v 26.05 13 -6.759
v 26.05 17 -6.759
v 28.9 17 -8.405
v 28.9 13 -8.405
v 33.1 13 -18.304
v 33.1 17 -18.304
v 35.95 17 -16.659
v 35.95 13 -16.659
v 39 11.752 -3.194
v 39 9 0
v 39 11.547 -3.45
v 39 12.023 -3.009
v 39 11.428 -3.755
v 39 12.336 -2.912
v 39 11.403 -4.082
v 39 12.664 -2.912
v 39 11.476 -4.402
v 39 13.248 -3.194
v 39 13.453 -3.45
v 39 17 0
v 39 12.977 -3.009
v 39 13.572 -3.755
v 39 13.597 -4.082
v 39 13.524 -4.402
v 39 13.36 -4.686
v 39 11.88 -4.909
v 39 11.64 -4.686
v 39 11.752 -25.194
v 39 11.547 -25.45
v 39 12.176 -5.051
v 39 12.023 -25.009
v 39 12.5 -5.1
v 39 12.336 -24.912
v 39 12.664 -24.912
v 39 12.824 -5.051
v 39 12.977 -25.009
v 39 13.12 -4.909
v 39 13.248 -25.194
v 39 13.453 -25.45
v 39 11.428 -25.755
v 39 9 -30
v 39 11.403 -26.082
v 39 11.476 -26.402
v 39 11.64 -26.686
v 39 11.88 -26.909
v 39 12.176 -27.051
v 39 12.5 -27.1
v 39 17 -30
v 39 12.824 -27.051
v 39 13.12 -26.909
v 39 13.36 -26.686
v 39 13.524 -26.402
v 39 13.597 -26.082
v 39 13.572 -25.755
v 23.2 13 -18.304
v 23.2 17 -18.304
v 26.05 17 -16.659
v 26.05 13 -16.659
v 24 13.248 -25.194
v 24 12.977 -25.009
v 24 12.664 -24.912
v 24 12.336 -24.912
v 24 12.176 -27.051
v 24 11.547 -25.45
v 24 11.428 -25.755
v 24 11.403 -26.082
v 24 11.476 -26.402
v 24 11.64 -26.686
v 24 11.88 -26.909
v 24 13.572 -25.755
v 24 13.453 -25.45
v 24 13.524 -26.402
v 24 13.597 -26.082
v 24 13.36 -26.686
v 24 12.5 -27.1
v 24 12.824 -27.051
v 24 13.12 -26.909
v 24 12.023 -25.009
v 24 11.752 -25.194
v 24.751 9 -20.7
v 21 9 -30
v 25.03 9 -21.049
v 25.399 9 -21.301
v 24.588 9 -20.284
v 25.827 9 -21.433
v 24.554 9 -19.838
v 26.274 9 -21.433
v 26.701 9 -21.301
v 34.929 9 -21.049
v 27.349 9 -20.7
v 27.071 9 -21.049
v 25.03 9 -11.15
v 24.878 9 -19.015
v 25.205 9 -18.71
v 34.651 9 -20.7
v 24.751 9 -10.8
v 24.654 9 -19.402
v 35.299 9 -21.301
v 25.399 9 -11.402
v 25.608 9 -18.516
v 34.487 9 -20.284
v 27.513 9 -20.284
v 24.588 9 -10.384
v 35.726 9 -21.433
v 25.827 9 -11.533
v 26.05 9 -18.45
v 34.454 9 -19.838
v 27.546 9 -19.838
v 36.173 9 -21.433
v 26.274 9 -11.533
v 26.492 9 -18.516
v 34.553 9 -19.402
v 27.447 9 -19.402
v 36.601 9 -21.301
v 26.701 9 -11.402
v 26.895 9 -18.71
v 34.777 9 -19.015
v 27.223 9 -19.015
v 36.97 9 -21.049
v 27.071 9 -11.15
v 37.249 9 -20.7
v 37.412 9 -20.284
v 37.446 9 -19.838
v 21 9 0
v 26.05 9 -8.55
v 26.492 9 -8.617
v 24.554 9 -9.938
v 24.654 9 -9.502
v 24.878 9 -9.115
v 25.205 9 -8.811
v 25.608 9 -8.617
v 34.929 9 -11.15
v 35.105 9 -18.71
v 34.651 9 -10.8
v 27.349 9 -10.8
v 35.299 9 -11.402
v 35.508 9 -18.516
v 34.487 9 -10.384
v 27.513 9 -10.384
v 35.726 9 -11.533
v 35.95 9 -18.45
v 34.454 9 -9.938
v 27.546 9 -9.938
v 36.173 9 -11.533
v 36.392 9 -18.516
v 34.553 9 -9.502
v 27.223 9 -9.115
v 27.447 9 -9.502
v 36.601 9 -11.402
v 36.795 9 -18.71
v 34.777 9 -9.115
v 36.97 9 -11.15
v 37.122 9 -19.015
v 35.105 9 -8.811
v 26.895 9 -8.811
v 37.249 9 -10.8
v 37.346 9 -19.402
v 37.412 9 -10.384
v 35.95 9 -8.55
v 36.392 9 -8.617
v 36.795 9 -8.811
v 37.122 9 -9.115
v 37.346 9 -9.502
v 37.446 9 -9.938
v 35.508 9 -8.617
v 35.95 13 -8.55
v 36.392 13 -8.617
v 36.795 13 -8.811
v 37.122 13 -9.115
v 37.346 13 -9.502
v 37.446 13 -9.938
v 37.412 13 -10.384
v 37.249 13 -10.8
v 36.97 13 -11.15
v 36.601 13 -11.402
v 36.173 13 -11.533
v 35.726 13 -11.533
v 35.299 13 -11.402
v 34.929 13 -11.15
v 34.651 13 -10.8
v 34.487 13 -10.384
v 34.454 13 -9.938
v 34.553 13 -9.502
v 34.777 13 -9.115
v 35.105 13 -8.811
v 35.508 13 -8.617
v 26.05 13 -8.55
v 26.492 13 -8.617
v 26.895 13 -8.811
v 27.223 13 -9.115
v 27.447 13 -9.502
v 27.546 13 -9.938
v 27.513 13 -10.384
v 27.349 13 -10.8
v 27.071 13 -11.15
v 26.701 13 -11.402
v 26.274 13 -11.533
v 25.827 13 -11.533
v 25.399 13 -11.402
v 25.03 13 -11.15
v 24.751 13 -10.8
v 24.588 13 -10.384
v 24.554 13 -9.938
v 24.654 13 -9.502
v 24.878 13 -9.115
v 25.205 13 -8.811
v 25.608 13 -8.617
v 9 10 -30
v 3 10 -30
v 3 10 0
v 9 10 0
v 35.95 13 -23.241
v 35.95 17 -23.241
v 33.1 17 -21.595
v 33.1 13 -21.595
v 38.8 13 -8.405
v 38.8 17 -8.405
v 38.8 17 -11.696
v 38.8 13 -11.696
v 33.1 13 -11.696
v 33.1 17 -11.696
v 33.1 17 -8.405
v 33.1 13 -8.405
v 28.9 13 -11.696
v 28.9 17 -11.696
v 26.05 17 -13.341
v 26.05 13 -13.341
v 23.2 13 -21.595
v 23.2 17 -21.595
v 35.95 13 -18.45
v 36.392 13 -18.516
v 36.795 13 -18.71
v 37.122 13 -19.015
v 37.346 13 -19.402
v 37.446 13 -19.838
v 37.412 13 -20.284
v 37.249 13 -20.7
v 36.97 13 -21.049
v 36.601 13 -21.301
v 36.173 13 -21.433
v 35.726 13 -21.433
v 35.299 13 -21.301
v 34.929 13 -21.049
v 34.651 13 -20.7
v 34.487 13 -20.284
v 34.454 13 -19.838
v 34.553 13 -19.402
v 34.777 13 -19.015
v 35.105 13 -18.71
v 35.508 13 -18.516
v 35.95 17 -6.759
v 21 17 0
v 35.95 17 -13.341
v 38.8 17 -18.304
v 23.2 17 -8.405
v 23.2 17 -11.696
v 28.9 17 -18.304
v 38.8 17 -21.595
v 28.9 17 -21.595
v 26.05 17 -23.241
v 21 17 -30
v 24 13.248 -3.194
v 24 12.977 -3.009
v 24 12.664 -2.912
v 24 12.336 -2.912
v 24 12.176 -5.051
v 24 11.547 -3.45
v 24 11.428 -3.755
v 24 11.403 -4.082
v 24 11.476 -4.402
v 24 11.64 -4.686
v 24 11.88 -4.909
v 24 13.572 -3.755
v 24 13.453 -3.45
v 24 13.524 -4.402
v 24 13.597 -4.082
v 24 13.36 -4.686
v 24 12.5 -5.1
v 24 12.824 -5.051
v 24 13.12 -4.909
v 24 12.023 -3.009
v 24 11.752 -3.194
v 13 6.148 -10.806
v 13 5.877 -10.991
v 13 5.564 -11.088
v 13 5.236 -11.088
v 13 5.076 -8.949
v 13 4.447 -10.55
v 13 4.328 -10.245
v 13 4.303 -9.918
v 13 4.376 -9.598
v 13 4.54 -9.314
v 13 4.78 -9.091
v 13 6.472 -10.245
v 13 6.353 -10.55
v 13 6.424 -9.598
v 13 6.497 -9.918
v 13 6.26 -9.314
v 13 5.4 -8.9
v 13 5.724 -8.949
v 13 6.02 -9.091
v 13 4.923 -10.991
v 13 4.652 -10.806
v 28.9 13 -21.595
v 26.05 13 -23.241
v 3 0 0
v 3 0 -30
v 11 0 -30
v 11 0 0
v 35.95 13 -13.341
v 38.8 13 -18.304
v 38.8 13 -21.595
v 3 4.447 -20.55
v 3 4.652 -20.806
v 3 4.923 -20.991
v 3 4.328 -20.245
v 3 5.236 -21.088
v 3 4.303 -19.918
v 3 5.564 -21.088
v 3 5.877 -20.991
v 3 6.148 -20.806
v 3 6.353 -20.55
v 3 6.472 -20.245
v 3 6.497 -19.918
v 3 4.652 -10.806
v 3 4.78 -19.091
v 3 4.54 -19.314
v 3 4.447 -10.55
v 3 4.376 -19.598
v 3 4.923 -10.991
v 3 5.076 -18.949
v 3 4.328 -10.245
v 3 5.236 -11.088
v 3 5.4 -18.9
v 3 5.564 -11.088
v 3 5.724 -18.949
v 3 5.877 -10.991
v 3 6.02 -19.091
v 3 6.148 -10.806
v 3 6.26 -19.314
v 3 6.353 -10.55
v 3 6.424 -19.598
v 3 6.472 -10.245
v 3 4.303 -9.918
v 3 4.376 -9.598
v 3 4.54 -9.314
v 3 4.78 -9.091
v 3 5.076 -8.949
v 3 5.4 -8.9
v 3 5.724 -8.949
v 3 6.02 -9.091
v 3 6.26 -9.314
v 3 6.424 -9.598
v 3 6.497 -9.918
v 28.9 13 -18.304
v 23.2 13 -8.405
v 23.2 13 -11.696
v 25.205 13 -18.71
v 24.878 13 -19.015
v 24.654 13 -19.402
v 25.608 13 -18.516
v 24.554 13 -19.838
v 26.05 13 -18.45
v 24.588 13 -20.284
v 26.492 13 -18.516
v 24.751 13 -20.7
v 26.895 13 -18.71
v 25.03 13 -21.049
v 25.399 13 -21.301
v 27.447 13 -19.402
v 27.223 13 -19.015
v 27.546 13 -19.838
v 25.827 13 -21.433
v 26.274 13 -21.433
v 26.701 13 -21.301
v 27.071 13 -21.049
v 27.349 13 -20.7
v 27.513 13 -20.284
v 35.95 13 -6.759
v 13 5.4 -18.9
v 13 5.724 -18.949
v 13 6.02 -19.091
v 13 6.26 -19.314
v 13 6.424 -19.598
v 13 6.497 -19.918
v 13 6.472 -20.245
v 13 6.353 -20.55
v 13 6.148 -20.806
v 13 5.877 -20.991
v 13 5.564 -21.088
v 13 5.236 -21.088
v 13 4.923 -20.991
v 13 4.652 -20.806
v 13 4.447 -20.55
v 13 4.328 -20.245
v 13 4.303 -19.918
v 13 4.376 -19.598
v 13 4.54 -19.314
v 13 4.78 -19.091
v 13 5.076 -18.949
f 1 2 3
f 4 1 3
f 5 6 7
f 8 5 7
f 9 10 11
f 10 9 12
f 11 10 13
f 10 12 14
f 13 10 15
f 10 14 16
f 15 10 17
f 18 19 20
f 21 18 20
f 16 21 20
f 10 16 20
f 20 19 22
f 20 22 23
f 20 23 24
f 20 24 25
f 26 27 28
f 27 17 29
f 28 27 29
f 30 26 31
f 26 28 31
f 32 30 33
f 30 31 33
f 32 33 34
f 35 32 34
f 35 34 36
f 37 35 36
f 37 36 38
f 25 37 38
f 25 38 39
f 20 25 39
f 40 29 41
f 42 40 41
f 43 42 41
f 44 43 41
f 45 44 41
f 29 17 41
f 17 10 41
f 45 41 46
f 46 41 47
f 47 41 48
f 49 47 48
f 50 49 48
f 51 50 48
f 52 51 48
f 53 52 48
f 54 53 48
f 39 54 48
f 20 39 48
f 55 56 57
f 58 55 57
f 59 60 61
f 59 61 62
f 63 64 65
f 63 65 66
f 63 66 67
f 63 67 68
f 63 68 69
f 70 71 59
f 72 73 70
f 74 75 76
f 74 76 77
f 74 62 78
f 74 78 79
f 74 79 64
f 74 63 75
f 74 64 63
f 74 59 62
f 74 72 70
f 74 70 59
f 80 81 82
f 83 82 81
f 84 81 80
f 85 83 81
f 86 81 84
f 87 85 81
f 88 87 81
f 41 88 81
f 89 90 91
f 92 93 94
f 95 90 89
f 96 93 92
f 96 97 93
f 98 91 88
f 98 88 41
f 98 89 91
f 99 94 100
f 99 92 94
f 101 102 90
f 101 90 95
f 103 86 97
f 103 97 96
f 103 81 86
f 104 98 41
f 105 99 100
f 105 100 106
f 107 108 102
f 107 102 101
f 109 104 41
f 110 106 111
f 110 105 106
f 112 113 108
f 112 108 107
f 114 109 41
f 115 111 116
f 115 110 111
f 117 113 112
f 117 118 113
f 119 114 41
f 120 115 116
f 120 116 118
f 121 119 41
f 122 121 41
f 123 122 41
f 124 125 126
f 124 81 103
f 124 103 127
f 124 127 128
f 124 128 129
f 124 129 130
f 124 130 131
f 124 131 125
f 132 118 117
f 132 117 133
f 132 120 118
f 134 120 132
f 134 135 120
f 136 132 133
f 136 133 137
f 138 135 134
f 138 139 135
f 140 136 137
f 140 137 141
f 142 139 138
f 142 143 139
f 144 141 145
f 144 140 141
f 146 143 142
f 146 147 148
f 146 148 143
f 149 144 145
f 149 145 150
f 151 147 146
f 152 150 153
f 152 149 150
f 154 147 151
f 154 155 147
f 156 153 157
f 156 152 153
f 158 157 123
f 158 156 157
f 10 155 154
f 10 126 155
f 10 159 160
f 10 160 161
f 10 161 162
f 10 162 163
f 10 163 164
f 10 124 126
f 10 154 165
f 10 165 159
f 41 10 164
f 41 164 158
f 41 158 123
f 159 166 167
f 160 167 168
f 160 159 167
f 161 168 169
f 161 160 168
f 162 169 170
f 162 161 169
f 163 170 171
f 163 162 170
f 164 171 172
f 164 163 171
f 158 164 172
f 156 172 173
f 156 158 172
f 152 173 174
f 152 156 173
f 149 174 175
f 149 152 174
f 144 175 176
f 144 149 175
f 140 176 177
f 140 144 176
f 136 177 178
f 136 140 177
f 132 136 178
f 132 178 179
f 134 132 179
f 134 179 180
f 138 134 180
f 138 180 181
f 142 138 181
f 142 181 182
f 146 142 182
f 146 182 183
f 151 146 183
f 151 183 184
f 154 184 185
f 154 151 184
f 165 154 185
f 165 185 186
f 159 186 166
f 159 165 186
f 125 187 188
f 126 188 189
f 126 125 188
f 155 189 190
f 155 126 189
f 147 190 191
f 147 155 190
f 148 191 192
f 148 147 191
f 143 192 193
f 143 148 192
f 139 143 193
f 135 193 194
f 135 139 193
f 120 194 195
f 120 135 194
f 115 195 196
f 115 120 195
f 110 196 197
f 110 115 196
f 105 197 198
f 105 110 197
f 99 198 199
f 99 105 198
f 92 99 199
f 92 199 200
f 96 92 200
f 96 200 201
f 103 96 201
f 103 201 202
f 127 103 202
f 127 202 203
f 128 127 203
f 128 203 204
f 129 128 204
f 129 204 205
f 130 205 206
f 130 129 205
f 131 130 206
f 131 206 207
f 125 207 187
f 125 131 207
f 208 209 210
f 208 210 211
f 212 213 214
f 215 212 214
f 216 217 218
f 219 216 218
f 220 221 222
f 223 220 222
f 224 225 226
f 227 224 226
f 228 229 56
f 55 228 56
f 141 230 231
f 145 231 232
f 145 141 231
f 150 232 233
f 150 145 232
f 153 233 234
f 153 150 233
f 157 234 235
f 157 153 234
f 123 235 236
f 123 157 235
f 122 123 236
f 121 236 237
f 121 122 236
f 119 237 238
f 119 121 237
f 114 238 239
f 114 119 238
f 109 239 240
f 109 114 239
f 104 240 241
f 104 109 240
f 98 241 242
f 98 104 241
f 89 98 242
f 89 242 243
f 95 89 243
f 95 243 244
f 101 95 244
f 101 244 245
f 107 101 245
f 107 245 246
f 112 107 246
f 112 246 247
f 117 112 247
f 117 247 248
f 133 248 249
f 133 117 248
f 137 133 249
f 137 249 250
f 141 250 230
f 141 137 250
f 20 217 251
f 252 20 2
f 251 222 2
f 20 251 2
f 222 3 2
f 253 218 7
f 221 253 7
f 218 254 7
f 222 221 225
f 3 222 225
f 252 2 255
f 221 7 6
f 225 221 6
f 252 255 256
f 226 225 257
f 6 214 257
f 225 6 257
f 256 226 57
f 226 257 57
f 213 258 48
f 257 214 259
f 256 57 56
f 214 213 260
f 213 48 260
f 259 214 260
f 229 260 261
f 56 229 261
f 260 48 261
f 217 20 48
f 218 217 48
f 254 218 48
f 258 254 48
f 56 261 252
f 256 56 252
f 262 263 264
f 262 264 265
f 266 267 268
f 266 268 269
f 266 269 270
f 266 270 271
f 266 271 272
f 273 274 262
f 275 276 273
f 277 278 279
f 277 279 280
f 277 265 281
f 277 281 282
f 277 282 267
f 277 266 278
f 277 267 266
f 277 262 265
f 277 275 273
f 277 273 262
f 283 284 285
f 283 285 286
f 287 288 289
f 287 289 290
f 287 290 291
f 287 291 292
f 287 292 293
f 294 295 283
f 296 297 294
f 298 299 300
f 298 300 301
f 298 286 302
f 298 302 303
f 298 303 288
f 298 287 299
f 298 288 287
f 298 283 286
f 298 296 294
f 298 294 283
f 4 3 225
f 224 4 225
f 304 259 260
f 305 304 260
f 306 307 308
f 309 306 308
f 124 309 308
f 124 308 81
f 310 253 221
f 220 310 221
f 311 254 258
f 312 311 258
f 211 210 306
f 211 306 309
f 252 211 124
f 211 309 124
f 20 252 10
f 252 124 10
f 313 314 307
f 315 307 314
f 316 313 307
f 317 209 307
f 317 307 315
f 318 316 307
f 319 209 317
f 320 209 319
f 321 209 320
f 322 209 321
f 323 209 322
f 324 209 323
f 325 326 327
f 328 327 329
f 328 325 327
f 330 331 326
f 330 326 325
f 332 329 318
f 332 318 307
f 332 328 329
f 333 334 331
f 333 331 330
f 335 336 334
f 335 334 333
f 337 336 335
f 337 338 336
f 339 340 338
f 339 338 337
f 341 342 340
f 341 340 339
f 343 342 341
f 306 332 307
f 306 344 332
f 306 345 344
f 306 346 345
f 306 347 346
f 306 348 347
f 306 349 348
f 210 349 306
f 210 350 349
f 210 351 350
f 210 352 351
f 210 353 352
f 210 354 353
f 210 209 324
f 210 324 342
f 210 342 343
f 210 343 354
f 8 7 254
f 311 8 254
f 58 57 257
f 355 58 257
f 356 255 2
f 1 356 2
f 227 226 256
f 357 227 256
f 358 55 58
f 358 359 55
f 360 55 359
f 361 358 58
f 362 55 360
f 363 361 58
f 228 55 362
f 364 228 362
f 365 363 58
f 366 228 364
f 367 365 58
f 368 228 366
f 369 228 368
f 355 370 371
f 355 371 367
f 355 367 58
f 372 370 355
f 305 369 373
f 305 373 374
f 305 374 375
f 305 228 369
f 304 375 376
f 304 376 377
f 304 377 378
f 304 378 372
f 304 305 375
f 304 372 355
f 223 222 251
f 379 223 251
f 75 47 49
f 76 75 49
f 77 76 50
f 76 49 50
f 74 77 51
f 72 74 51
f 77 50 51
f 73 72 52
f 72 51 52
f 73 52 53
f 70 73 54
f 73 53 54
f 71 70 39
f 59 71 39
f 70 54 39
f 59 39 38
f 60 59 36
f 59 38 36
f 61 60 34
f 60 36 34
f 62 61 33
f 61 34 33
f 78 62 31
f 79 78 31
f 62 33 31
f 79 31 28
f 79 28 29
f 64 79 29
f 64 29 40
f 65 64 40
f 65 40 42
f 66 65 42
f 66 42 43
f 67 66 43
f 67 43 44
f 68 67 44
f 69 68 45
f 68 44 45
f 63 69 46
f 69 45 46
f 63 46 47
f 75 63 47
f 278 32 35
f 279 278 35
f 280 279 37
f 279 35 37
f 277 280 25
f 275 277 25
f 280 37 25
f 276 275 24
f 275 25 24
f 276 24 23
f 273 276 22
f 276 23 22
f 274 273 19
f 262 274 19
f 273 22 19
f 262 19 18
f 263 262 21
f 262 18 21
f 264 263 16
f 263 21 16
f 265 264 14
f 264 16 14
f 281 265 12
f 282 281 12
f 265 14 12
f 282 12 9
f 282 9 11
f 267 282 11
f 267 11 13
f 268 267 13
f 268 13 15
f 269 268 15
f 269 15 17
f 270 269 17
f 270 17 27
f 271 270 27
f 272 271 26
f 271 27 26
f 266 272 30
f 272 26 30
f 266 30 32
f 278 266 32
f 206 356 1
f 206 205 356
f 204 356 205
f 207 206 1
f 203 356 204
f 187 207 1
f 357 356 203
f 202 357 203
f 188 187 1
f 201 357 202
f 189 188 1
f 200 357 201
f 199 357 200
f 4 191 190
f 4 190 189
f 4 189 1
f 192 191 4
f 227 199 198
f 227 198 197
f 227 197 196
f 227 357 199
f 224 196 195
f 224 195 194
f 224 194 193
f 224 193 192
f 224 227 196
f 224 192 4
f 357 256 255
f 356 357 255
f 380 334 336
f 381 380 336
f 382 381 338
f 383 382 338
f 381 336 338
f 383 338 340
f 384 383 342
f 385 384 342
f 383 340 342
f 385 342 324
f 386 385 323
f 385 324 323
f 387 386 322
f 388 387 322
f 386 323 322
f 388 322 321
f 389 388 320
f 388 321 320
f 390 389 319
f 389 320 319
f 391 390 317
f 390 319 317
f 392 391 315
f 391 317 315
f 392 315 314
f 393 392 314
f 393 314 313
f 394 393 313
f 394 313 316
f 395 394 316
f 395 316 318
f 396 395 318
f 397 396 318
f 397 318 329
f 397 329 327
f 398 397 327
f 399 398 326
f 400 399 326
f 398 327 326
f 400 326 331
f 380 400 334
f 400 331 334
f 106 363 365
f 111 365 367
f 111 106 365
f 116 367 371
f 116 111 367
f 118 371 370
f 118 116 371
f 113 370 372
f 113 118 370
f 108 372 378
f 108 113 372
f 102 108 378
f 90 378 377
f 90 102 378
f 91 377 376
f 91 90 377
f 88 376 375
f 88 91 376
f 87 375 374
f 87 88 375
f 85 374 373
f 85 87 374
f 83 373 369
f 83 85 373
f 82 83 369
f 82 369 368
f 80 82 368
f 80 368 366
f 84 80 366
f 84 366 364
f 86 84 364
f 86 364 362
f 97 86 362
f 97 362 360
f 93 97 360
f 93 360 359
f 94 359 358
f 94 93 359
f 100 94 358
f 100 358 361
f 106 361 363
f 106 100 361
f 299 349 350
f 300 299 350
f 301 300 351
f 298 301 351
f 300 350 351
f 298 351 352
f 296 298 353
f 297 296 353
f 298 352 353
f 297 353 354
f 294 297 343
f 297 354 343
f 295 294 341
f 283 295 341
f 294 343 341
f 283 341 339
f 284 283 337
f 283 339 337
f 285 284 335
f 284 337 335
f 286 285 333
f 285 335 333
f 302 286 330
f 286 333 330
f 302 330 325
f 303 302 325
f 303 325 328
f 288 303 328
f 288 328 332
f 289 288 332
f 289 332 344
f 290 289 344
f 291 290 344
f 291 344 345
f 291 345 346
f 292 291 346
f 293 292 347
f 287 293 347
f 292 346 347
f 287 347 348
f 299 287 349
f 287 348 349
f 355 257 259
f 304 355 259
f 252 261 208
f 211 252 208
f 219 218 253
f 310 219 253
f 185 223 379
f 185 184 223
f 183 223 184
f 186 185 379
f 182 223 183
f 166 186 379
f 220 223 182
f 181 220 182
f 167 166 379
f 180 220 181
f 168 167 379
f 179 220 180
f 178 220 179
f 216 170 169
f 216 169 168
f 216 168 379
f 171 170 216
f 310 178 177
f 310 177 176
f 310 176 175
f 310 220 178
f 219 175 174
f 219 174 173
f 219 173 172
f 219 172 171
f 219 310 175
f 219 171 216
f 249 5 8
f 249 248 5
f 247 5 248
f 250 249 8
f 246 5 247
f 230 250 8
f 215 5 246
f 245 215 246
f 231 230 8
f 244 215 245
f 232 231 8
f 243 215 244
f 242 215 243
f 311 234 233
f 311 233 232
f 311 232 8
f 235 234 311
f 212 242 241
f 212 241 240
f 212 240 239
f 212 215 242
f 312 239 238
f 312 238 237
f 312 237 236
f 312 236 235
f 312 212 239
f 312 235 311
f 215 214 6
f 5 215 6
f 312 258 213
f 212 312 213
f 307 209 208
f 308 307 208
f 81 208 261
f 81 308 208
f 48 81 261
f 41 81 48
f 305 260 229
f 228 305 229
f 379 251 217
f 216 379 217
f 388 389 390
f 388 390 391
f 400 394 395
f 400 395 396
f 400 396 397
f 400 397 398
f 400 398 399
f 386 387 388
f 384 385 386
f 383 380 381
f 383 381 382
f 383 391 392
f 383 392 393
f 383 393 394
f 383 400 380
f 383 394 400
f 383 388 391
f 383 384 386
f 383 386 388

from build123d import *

# Parameters (mm, degrees)
SKETCH_1_W          = 41
SKETCH_1_H          = 30
EXTRUDE_1_DEPTH     = 10
SKETCH_3_W          = 30
SKETCH_3_H          = 10
CUT_EXTRUDE_2_DEPTH = 3
EXTRUDE_3_DEPTH     = 30
SKETCH_6_W          = 20
SKETCH_6_H          = 30
CUT_EXTRUDE_5_DEPTH = 9
SKETCH_2_R          = 1.1
CUT_EXTRUDE_1_DEPTH = 15
SKETCH_8_R          = 1.5
CUT_EXTRUDE_6_DEPTH = 52.594573358
SKETCH_4_R          = 1.1
CUT_EXTRUDE_3_DEPTH = 10
CUT_EXTRUDE_7_DEPTH = 54.572380944
CUT_EXTRUDE_8_DEPTH = 4
SKETCH_11_W         = 4.132049734
SKETCH_11_H         = 3.255839909
CUT_EXTRUDE_9_DEPTH = 54.572380944


with BuildPart() as part:
    # Эскиз1 → Бобышка-Вытянуть1 (new body)
    with BuildSketch(Plane(origin=(0, 0, 0), x_dir=(1, 0, 0), z_dir=(0, 1, 0))):
        with Locations((20.5, 15)):
            Rectangle(SKETCH_1_W, SKETCH_1_H)
    extrude(amount=EXTRUDE_1_DEPTH)

    # Эскиз3 → Вырез-Вытянуть2 (cut)
    with BuildSketch(Plane.ZY):
        with Locations((-15, 5)):
            Rectangle(SKETCH_3_W, SKETCH_3_H)
    extrude(amount=-CUT_EXTRUDE_2_DEPTH, mode=Mode.SUBTRACT)

    # Эскиз7 → Бобышка-Вытянуть3 (add)
    with BuildSketch(Plane(origin=(0, 0, -30), x_dir=(-1, 0, 0), z_dir=(0, 0, -1))):
        Polygon((-39, 17), (-21, 17), (-9, 10), (-39, 10), align=None)
    extrude(amount=-EXTRUDE_3_DEPTH)

    # Эскиз6 → Вырез-Вытянуть5 (cut)
    with BuildSketch(Plane.XZ):
        with Locations((31, -15)):
            Rectangle(SKETCH_6_W, SKETCH_6_H)
    extrude(amount=-CUT_EXTRUDE_5_DEPTH, mode=Mode.SUBTRACT)

    # Эскиз2 → Вырез-Вытянуть1 (cut)
    with BuildSketch(Plane(origin=(39, 0, 0), x_dir=(0, 0, -1), z_dir=(1, 0, 0))):
        with Locations((4, 12.5)):
            Circle(SKETCH_2_R)
        with Locations((26, 12.5)):
            Circle(SKETCH_2_R)
    extrude(amount=-CUT_EXTRUDE_1_DEPTH, mode=Mode.SUBTRACT)

    # Эскиз8 → Вырез-Вытянуть6 (cut, through all)
    with BuildSketch(Plane(origin=(0, 9, 0), x_dir=(1, 0, 0), z_dir=(0, 1, 0))):
        with Locations(Location((35.949747468, 19.949747468, 0), (0, 0, 270))):
            Circle(SKETCH_8_R)
        with Locations(Location((35.949747468, 10.050252532, 0), (0, 0, 270))):
            Circle(SKETCH_8_R)
        with Locations(Location((26.050252532, 10.050252532, 0), (0, 0, 270))):
            Circle(SKETCH_8_R)
        with Locations(Location((26.050252532, 19.949747468, 0), (0, 0, 270))):
            Circle(SKETCH_8_R)
    extrude(amount=CUT_EXTRUDE_6_DEPTH, mode=Mode.SUBTRACT)

    # Эскиз4 → Вырез-Вытянуть3 (cut)
    with BuildSketch(Plane.ZY.offset(-3)):
        with Locations((-20, 5.4)):
            Circle(SKETCH_4_R)
        with Locations((-10, 5.4)):
            Circle(SKETCH_4_R)
    extrude(amount=-CUT_EXTRUDE_3_DEPTH, mode=Mode.SUBTRACT)

    # Эскиз9 → Вырез-Вытянуть7 (cut, through all)
    with BuildSketch(Plane(origin=(0, 0, -30), x_dir=(-1, 0, 0), z_dir=(0, 0, -1))):
        Polygon((-21, 9), (-21, 0), (-11, 0), align=None)
    extrude(amount=-CUT_EXTRUDE_7_DEPTH, mode=Mode.SUBTRACT)

    # Эскиз10 → Вырез-Вытянуть8 (cut)
    with BuildSketch(Plane(origin=(0, 17, 0), x_dir=(1, 0, 0), z_dir=(0, 1, 0))):
        Polygon((26.050252532, 23.240644003), (23.200252532, 21.595195735), (23.200252532, 18.304299201), (26.050252532, 16.658850934), (28.900252532, 18.304299201), (28.900252532, 21.595195735), align=None)
        Polygon((35.949747468, 23.240644003), (33.099747468, 21.595195735), (33.099747468, 18.304299201), (35.949747468, 16.658850934), (38.799747468, 18.304299201), (38.799747468, 21.595195735), align=None)
        Polygon((35.949747468, 13.341149066), (33.099747468, 11.695700799), (33.099747468, 8.404804265), (35.949747468, 6.759355997), (38.799747468, 8.404804265), (38.799747468, 11.695700799), align=None)
        Polygon((26.050252532, 13.341149066), (23.200252532, 11.695700799), (23.200252532, 8.404804265), (26.050252532, 6.759355997), (28.900252532, 8.404804265), (28.900252532, 11.695700799), align=None)
    extrude(amount=-CUT_EXTRUDE_8_DEPTH, mode=Mode.SUBTRACT)

    # Эскиз11 → Вырез-Вытянуть9 (cut, through all)
    with BuildSketch(Plane(origin=(0, 0, -30), x_dir=(-1, 0, 0), z_dir=(0, 0, -1))):
        with Locations((-41.066024867, 8.372080046)):
            Rectangle(SKETCH_11_W, SKETCH_11_H)
    extrude(amount=-CUT_EXTRUDE_9_DEPTH, mode=Mode.SUBTRACT)


solid = part.part
